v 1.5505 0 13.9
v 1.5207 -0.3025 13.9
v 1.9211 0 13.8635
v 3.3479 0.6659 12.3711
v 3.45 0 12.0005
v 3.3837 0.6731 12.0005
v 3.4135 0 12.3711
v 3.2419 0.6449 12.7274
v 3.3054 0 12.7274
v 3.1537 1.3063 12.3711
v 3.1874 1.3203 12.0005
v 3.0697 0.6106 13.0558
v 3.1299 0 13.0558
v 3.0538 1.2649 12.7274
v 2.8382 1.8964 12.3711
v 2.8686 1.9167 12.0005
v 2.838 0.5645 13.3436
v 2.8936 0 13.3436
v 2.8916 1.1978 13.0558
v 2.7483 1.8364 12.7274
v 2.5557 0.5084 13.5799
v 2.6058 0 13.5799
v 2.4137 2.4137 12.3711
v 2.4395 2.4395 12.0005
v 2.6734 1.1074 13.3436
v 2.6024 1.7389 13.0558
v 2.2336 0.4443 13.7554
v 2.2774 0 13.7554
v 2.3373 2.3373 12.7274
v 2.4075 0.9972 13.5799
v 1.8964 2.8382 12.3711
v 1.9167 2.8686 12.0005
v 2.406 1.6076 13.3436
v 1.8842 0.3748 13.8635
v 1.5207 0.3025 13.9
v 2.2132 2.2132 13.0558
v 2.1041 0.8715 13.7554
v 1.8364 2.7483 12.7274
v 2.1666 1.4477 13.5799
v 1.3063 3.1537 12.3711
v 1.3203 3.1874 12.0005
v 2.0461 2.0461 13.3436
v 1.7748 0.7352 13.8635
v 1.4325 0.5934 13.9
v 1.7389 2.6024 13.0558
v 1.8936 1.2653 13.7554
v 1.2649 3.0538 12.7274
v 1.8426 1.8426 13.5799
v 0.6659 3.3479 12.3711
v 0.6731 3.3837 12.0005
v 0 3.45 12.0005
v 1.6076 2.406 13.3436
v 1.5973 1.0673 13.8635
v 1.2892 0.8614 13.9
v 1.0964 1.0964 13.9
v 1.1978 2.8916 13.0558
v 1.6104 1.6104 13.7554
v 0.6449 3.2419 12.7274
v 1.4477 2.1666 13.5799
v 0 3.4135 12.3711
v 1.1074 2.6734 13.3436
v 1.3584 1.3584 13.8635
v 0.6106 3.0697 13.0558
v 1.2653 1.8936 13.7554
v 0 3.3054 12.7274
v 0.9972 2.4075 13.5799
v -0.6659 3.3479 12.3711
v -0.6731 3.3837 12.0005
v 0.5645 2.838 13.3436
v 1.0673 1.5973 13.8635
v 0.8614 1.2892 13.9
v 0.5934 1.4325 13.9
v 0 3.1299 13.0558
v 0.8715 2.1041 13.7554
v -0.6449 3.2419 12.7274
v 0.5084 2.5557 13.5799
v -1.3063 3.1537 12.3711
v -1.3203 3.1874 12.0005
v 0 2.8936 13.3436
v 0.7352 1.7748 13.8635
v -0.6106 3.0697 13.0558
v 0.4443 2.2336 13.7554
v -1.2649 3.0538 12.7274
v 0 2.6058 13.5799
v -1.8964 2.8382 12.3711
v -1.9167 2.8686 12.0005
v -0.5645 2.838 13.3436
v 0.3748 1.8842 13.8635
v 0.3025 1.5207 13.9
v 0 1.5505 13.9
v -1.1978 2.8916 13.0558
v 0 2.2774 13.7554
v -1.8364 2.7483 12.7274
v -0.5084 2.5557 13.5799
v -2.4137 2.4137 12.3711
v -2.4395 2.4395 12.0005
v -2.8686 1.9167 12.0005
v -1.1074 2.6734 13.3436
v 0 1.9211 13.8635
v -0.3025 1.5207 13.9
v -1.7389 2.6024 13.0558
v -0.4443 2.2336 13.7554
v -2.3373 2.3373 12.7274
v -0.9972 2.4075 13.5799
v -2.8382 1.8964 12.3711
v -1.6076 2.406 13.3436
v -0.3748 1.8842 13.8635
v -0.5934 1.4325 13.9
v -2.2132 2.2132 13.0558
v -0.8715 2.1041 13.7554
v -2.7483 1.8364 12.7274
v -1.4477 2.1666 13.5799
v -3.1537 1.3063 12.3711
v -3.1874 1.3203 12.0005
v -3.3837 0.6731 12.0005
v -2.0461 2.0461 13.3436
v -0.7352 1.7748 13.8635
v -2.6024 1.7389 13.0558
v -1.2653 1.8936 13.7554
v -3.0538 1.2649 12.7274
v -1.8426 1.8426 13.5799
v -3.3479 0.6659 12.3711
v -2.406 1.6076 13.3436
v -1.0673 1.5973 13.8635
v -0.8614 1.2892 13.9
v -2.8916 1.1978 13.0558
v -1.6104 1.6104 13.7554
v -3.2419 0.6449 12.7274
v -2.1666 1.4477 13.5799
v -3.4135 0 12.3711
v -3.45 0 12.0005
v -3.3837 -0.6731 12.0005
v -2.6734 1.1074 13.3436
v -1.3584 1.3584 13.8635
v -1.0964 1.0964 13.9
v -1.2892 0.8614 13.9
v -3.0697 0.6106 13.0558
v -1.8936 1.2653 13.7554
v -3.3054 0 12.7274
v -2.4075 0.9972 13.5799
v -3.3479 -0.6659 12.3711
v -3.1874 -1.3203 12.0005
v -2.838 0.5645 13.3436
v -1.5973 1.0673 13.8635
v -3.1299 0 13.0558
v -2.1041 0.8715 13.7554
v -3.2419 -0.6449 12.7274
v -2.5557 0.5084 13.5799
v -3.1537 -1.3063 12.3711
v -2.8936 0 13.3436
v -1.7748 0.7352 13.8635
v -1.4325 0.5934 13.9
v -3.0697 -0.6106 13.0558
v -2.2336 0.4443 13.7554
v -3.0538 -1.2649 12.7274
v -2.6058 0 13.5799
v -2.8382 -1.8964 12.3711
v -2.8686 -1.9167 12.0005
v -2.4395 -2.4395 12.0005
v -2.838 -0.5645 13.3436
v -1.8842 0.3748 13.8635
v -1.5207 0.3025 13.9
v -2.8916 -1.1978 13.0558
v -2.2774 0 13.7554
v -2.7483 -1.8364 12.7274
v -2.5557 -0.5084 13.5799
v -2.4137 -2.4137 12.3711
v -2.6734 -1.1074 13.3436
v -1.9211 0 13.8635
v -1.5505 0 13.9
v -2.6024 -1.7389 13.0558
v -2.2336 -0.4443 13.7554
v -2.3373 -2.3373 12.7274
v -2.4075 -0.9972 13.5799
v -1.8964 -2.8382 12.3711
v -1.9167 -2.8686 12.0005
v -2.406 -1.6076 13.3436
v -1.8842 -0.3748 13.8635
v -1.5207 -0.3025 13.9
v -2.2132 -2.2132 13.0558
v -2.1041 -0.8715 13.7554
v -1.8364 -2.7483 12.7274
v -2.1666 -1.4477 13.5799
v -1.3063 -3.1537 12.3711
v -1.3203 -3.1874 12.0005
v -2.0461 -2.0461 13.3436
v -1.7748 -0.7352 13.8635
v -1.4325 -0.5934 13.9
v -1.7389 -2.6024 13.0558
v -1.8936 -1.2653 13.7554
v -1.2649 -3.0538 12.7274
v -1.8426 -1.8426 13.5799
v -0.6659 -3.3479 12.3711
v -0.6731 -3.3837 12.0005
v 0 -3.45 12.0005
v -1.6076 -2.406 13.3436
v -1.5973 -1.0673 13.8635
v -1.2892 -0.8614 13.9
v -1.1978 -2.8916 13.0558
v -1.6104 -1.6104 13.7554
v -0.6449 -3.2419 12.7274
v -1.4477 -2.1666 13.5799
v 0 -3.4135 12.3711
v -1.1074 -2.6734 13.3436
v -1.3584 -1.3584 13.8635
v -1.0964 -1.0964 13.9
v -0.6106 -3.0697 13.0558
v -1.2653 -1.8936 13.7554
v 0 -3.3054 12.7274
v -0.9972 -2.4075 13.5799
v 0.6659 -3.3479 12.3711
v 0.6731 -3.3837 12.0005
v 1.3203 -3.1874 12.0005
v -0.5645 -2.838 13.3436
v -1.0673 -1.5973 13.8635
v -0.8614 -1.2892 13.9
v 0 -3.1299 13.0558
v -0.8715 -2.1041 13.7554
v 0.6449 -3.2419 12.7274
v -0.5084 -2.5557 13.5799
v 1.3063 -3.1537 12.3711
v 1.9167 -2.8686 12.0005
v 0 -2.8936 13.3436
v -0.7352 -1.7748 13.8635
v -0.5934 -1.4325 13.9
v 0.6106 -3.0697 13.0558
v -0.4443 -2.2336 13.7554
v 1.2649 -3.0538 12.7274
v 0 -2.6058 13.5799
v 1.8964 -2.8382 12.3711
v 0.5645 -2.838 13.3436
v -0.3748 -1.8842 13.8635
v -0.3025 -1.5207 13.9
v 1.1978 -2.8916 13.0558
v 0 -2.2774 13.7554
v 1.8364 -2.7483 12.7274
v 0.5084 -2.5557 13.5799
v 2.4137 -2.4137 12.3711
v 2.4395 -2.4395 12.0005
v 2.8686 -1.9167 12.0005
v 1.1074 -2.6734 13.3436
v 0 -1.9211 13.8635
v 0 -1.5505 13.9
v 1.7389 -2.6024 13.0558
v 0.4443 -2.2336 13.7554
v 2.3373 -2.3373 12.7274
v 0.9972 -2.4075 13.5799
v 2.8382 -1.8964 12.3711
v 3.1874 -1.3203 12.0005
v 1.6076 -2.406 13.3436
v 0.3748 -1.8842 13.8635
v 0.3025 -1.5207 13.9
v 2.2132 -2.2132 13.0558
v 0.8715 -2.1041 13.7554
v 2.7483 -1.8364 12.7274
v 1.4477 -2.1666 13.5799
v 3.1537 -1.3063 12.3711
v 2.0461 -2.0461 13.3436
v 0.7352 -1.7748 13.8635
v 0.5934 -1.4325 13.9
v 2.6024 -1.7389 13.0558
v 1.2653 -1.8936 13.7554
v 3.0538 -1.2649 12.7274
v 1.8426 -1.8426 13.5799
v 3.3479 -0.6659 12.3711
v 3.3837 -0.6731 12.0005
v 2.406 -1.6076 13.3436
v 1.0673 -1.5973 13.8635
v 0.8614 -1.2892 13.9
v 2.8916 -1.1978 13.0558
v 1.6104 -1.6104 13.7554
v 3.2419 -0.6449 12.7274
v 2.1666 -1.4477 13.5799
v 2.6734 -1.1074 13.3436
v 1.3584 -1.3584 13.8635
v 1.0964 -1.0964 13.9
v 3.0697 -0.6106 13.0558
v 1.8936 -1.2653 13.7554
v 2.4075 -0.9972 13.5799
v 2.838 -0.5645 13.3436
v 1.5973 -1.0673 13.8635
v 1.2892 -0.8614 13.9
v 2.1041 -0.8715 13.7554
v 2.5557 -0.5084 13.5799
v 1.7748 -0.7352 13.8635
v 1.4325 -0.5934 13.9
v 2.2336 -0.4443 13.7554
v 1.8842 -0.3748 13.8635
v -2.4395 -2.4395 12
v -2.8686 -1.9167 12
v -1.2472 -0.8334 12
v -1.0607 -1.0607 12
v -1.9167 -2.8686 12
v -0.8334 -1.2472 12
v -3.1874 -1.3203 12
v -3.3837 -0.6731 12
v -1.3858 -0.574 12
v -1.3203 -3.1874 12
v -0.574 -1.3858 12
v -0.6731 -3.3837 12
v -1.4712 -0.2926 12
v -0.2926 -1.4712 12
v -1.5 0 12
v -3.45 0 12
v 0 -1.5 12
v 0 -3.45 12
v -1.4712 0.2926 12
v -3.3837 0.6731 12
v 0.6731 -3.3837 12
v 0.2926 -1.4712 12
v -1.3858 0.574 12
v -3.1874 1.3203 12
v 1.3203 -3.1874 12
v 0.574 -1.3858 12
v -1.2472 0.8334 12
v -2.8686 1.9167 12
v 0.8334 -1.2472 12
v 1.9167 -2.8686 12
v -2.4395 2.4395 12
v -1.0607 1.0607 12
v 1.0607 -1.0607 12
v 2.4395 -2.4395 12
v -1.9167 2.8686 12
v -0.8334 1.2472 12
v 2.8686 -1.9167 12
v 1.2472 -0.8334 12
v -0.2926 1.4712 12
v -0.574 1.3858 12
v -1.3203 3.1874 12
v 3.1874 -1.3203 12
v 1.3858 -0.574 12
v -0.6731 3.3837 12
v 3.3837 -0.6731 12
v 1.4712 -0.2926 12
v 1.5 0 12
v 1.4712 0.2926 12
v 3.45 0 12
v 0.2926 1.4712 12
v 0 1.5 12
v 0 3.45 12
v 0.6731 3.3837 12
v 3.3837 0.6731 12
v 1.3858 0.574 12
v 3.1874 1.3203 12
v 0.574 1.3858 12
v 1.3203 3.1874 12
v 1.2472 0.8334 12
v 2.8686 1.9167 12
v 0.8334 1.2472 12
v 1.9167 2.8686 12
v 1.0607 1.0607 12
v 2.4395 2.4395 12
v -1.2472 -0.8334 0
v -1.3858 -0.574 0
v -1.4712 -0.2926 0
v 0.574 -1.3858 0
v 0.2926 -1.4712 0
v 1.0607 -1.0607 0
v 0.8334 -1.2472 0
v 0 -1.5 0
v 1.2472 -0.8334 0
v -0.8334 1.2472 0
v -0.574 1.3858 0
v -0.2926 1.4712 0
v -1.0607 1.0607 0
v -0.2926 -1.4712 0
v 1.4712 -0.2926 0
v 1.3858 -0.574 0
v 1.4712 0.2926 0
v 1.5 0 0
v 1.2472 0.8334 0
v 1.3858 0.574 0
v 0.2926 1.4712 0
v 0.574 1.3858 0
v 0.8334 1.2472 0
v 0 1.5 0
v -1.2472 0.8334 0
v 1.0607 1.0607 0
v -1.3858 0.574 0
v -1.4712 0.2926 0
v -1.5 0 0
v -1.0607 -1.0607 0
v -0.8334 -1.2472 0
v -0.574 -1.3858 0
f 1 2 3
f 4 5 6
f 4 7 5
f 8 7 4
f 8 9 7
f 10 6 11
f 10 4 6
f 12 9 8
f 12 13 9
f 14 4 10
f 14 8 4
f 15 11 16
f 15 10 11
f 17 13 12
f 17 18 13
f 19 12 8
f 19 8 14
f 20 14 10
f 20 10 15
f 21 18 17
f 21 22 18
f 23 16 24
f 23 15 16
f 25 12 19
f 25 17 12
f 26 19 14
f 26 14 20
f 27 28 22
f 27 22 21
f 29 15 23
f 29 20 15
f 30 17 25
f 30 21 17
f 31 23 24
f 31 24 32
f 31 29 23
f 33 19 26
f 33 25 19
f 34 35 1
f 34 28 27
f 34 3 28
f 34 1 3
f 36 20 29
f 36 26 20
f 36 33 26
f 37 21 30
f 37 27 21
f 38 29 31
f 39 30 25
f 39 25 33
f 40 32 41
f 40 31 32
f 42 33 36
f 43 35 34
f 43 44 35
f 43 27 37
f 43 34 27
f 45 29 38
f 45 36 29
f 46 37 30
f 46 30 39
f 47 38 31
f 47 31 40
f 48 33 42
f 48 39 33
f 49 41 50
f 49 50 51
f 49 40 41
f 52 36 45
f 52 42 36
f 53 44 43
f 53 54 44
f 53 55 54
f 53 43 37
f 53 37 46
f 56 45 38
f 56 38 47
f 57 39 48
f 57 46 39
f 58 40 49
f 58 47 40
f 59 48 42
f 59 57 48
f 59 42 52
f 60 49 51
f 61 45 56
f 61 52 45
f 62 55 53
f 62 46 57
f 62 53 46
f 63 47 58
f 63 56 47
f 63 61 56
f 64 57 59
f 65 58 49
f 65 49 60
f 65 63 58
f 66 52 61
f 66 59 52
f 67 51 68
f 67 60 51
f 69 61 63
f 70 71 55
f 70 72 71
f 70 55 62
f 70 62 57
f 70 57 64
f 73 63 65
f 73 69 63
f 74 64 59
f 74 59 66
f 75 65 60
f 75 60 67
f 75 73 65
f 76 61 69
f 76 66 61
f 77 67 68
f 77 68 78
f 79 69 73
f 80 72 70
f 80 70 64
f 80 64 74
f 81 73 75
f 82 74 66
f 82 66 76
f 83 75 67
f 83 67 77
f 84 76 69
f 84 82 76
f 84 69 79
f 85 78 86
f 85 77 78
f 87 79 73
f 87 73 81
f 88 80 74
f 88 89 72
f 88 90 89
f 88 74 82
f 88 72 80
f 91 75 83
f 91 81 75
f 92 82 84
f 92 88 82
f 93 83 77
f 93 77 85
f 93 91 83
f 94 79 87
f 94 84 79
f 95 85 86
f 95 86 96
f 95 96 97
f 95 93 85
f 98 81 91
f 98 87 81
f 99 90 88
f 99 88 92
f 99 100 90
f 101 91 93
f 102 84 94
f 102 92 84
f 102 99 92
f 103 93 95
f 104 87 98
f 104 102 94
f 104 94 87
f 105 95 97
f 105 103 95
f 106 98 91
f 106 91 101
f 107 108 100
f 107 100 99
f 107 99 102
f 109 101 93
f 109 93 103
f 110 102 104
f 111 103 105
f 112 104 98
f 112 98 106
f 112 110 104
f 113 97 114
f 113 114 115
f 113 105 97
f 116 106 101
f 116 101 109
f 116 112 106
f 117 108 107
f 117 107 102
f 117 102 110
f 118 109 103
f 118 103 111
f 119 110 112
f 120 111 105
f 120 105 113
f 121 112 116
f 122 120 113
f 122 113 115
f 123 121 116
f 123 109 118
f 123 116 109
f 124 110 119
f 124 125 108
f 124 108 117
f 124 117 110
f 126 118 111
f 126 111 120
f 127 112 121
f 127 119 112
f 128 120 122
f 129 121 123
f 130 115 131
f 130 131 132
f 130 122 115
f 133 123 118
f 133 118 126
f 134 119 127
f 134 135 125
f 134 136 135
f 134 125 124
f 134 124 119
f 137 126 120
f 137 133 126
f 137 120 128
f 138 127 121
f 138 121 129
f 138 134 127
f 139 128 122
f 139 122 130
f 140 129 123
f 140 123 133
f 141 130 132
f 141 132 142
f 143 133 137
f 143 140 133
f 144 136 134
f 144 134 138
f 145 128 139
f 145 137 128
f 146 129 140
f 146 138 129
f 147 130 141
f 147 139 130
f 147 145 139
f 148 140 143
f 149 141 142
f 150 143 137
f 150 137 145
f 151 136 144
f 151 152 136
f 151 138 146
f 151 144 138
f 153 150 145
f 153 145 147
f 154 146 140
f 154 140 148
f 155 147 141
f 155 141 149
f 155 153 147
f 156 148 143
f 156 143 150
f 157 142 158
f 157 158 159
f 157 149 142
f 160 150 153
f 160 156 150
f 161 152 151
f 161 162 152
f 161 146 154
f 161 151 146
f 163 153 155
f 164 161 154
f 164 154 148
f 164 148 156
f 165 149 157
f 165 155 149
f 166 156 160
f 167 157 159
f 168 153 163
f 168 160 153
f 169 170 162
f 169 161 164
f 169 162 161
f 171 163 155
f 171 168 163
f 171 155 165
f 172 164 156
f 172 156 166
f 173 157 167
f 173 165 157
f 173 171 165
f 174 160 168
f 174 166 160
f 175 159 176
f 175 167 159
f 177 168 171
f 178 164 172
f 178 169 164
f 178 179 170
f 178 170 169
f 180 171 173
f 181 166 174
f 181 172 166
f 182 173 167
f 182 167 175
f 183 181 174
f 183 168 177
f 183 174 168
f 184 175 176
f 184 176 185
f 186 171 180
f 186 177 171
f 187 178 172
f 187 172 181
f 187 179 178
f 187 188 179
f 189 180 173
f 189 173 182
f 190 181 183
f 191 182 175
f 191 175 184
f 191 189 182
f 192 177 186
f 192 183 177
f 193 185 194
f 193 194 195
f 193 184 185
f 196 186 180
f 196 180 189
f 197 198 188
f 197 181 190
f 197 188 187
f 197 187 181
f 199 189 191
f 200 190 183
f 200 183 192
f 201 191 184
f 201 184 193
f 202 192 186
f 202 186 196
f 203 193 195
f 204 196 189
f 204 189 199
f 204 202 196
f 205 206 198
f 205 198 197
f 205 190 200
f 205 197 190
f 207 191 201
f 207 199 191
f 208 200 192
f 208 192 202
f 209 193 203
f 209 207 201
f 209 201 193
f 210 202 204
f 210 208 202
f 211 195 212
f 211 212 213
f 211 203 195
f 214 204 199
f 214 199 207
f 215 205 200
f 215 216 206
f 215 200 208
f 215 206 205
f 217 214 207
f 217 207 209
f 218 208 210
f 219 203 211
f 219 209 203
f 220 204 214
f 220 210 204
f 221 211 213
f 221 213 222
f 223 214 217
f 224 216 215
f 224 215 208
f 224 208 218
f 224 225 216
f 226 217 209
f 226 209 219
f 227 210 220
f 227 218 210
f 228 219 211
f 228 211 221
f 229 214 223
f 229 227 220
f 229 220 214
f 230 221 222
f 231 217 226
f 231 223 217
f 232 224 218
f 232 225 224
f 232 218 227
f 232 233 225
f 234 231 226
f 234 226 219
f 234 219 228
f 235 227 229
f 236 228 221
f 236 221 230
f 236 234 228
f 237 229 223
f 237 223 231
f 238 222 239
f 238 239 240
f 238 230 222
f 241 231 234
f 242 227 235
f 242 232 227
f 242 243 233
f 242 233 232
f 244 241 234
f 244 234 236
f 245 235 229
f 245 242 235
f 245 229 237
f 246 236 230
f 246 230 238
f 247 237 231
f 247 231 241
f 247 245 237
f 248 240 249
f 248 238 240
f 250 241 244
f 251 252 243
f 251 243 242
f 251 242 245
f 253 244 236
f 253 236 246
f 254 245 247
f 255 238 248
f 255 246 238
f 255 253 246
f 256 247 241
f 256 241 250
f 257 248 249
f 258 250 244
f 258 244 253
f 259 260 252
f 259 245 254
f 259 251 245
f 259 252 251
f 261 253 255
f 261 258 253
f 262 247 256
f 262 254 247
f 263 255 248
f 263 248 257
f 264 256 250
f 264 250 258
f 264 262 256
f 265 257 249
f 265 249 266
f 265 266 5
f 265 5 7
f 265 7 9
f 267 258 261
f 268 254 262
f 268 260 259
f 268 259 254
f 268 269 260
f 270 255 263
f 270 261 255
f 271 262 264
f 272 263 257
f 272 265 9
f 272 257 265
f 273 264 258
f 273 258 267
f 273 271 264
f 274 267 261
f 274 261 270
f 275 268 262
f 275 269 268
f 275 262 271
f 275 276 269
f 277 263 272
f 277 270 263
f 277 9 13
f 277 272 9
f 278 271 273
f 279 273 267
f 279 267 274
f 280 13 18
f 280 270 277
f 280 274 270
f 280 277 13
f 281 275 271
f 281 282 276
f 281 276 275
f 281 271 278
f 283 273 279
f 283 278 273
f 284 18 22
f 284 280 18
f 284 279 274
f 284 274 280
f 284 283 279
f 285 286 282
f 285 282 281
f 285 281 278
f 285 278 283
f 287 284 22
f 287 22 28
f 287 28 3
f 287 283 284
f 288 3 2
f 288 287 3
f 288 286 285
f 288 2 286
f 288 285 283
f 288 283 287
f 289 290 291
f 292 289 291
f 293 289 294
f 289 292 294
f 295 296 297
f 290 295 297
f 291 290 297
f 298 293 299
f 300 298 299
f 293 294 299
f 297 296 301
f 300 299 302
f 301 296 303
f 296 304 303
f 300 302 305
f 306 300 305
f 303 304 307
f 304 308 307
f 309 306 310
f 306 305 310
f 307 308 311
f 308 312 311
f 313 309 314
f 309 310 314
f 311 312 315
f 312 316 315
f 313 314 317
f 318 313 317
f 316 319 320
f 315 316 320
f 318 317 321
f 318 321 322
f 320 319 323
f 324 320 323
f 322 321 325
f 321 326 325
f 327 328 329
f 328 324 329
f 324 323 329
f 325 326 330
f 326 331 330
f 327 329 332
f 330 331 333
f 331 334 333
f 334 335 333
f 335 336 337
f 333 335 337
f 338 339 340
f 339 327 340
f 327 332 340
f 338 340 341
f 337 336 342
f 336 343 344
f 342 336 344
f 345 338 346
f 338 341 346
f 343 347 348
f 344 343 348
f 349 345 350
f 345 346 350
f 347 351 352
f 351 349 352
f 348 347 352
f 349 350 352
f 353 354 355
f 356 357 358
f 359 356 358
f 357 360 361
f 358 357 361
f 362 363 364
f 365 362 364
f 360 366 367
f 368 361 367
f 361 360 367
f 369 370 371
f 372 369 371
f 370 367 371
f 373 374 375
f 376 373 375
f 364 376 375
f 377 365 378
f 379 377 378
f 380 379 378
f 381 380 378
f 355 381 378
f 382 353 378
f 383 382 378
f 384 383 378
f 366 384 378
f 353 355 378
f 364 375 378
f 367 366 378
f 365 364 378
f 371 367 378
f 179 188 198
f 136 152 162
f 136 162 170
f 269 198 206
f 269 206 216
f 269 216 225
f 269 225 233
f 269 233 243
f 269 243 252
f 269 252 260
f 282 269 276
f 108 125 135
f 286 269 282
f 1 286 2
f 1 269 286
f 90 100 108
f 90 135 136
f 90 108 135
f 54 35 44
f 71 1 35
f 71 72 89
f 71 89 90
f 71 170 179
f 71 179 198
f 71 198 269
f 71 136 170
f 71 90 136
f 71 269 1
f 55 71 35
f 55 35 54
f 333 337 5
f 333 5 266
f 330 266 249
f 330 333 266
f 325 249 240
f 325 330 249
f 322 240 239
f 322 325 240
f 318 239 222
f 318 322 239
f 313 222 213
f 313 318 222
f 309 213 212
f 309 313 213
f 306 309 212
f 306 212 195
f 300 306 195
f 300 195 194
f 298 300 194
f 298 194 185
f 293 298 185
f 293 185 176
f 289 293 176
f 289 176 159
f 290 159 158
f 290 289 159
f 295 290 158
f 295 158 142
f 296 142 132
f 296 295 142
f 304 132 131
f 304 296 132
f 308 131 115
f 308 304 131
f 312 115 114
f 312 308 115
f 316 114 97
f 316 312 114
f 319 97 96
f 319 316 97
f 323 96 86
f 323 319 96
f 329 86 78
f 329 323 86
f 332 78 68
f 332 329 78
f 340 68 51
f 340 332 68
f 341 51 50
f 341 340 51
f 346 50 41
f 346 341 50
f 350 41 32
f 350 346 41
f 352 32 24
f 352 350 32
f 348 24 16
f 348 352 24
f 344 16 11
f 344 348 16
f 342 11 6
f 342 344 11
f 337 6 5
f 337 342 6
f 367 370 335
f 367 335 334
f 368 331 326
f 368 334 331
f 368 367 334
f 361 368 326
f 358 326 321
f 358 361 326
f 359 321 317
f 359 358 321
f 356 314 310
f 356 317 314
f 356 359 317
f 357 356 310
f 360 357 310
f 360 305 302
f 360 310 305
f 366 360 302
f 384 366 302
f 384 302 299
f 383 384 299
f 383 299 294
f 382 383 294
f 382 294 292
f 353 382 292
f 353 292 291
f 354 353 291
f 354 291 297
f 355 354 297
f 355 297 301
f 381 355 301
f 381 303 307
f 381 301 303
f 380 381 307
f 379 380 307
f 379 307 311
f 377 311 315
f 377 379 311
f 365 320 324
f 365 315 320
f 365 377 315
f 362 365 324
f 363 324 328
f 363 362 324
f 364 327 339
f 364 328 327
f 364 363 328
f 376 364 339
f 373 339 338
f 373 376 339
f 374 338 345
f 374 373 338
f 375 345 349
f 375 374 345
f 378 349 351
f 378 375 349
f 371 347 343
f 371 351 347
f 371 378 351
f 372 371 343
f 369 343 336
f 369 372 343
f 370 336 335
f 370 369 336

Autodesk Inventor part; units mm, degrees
ref_plane "YZ Plane" through (0, 0, 0) normal (1, 0, 0) x (0, 1, 0)
ref_plane "XZ Plane" through (0, 0, 0) normal (0, 1, 0) x (-1, 0, 0)
ref_plane "XY Plane" through (0, 0, 0) normal (0, 0, 1) x (1, 0, 0)
sketch "スケッチ1" plane through (0, 0, 0) normal (0, 0, 1) x (1, 0, 0)
  circle A0 centre (0, 0) radius 1.5
  dimension "d0" = 3
extrude "押し出し1" add sketch "スケッチ1" along normal blind 12
sketch "スケッチ2" plane through (0, 0, 12) normal (0, 0, 1) x (1, 0, 0)
  circle A0 centre (0, 0) radius 3.45
  dimension "d3" = 6.9
extrude "押し出し2" add sketch "スケッチ2" along normal blind 1.9
fillet "フィレット1" radius 1.9 1 edges at (-3.45, 0, 13.9)
thread "ねじ1" size "M3x0.5" class "6g" standard "ANSI Metric M Profile" full length
properties part number "M3トラス頭ネジ　12" material "鉄 灰色"
